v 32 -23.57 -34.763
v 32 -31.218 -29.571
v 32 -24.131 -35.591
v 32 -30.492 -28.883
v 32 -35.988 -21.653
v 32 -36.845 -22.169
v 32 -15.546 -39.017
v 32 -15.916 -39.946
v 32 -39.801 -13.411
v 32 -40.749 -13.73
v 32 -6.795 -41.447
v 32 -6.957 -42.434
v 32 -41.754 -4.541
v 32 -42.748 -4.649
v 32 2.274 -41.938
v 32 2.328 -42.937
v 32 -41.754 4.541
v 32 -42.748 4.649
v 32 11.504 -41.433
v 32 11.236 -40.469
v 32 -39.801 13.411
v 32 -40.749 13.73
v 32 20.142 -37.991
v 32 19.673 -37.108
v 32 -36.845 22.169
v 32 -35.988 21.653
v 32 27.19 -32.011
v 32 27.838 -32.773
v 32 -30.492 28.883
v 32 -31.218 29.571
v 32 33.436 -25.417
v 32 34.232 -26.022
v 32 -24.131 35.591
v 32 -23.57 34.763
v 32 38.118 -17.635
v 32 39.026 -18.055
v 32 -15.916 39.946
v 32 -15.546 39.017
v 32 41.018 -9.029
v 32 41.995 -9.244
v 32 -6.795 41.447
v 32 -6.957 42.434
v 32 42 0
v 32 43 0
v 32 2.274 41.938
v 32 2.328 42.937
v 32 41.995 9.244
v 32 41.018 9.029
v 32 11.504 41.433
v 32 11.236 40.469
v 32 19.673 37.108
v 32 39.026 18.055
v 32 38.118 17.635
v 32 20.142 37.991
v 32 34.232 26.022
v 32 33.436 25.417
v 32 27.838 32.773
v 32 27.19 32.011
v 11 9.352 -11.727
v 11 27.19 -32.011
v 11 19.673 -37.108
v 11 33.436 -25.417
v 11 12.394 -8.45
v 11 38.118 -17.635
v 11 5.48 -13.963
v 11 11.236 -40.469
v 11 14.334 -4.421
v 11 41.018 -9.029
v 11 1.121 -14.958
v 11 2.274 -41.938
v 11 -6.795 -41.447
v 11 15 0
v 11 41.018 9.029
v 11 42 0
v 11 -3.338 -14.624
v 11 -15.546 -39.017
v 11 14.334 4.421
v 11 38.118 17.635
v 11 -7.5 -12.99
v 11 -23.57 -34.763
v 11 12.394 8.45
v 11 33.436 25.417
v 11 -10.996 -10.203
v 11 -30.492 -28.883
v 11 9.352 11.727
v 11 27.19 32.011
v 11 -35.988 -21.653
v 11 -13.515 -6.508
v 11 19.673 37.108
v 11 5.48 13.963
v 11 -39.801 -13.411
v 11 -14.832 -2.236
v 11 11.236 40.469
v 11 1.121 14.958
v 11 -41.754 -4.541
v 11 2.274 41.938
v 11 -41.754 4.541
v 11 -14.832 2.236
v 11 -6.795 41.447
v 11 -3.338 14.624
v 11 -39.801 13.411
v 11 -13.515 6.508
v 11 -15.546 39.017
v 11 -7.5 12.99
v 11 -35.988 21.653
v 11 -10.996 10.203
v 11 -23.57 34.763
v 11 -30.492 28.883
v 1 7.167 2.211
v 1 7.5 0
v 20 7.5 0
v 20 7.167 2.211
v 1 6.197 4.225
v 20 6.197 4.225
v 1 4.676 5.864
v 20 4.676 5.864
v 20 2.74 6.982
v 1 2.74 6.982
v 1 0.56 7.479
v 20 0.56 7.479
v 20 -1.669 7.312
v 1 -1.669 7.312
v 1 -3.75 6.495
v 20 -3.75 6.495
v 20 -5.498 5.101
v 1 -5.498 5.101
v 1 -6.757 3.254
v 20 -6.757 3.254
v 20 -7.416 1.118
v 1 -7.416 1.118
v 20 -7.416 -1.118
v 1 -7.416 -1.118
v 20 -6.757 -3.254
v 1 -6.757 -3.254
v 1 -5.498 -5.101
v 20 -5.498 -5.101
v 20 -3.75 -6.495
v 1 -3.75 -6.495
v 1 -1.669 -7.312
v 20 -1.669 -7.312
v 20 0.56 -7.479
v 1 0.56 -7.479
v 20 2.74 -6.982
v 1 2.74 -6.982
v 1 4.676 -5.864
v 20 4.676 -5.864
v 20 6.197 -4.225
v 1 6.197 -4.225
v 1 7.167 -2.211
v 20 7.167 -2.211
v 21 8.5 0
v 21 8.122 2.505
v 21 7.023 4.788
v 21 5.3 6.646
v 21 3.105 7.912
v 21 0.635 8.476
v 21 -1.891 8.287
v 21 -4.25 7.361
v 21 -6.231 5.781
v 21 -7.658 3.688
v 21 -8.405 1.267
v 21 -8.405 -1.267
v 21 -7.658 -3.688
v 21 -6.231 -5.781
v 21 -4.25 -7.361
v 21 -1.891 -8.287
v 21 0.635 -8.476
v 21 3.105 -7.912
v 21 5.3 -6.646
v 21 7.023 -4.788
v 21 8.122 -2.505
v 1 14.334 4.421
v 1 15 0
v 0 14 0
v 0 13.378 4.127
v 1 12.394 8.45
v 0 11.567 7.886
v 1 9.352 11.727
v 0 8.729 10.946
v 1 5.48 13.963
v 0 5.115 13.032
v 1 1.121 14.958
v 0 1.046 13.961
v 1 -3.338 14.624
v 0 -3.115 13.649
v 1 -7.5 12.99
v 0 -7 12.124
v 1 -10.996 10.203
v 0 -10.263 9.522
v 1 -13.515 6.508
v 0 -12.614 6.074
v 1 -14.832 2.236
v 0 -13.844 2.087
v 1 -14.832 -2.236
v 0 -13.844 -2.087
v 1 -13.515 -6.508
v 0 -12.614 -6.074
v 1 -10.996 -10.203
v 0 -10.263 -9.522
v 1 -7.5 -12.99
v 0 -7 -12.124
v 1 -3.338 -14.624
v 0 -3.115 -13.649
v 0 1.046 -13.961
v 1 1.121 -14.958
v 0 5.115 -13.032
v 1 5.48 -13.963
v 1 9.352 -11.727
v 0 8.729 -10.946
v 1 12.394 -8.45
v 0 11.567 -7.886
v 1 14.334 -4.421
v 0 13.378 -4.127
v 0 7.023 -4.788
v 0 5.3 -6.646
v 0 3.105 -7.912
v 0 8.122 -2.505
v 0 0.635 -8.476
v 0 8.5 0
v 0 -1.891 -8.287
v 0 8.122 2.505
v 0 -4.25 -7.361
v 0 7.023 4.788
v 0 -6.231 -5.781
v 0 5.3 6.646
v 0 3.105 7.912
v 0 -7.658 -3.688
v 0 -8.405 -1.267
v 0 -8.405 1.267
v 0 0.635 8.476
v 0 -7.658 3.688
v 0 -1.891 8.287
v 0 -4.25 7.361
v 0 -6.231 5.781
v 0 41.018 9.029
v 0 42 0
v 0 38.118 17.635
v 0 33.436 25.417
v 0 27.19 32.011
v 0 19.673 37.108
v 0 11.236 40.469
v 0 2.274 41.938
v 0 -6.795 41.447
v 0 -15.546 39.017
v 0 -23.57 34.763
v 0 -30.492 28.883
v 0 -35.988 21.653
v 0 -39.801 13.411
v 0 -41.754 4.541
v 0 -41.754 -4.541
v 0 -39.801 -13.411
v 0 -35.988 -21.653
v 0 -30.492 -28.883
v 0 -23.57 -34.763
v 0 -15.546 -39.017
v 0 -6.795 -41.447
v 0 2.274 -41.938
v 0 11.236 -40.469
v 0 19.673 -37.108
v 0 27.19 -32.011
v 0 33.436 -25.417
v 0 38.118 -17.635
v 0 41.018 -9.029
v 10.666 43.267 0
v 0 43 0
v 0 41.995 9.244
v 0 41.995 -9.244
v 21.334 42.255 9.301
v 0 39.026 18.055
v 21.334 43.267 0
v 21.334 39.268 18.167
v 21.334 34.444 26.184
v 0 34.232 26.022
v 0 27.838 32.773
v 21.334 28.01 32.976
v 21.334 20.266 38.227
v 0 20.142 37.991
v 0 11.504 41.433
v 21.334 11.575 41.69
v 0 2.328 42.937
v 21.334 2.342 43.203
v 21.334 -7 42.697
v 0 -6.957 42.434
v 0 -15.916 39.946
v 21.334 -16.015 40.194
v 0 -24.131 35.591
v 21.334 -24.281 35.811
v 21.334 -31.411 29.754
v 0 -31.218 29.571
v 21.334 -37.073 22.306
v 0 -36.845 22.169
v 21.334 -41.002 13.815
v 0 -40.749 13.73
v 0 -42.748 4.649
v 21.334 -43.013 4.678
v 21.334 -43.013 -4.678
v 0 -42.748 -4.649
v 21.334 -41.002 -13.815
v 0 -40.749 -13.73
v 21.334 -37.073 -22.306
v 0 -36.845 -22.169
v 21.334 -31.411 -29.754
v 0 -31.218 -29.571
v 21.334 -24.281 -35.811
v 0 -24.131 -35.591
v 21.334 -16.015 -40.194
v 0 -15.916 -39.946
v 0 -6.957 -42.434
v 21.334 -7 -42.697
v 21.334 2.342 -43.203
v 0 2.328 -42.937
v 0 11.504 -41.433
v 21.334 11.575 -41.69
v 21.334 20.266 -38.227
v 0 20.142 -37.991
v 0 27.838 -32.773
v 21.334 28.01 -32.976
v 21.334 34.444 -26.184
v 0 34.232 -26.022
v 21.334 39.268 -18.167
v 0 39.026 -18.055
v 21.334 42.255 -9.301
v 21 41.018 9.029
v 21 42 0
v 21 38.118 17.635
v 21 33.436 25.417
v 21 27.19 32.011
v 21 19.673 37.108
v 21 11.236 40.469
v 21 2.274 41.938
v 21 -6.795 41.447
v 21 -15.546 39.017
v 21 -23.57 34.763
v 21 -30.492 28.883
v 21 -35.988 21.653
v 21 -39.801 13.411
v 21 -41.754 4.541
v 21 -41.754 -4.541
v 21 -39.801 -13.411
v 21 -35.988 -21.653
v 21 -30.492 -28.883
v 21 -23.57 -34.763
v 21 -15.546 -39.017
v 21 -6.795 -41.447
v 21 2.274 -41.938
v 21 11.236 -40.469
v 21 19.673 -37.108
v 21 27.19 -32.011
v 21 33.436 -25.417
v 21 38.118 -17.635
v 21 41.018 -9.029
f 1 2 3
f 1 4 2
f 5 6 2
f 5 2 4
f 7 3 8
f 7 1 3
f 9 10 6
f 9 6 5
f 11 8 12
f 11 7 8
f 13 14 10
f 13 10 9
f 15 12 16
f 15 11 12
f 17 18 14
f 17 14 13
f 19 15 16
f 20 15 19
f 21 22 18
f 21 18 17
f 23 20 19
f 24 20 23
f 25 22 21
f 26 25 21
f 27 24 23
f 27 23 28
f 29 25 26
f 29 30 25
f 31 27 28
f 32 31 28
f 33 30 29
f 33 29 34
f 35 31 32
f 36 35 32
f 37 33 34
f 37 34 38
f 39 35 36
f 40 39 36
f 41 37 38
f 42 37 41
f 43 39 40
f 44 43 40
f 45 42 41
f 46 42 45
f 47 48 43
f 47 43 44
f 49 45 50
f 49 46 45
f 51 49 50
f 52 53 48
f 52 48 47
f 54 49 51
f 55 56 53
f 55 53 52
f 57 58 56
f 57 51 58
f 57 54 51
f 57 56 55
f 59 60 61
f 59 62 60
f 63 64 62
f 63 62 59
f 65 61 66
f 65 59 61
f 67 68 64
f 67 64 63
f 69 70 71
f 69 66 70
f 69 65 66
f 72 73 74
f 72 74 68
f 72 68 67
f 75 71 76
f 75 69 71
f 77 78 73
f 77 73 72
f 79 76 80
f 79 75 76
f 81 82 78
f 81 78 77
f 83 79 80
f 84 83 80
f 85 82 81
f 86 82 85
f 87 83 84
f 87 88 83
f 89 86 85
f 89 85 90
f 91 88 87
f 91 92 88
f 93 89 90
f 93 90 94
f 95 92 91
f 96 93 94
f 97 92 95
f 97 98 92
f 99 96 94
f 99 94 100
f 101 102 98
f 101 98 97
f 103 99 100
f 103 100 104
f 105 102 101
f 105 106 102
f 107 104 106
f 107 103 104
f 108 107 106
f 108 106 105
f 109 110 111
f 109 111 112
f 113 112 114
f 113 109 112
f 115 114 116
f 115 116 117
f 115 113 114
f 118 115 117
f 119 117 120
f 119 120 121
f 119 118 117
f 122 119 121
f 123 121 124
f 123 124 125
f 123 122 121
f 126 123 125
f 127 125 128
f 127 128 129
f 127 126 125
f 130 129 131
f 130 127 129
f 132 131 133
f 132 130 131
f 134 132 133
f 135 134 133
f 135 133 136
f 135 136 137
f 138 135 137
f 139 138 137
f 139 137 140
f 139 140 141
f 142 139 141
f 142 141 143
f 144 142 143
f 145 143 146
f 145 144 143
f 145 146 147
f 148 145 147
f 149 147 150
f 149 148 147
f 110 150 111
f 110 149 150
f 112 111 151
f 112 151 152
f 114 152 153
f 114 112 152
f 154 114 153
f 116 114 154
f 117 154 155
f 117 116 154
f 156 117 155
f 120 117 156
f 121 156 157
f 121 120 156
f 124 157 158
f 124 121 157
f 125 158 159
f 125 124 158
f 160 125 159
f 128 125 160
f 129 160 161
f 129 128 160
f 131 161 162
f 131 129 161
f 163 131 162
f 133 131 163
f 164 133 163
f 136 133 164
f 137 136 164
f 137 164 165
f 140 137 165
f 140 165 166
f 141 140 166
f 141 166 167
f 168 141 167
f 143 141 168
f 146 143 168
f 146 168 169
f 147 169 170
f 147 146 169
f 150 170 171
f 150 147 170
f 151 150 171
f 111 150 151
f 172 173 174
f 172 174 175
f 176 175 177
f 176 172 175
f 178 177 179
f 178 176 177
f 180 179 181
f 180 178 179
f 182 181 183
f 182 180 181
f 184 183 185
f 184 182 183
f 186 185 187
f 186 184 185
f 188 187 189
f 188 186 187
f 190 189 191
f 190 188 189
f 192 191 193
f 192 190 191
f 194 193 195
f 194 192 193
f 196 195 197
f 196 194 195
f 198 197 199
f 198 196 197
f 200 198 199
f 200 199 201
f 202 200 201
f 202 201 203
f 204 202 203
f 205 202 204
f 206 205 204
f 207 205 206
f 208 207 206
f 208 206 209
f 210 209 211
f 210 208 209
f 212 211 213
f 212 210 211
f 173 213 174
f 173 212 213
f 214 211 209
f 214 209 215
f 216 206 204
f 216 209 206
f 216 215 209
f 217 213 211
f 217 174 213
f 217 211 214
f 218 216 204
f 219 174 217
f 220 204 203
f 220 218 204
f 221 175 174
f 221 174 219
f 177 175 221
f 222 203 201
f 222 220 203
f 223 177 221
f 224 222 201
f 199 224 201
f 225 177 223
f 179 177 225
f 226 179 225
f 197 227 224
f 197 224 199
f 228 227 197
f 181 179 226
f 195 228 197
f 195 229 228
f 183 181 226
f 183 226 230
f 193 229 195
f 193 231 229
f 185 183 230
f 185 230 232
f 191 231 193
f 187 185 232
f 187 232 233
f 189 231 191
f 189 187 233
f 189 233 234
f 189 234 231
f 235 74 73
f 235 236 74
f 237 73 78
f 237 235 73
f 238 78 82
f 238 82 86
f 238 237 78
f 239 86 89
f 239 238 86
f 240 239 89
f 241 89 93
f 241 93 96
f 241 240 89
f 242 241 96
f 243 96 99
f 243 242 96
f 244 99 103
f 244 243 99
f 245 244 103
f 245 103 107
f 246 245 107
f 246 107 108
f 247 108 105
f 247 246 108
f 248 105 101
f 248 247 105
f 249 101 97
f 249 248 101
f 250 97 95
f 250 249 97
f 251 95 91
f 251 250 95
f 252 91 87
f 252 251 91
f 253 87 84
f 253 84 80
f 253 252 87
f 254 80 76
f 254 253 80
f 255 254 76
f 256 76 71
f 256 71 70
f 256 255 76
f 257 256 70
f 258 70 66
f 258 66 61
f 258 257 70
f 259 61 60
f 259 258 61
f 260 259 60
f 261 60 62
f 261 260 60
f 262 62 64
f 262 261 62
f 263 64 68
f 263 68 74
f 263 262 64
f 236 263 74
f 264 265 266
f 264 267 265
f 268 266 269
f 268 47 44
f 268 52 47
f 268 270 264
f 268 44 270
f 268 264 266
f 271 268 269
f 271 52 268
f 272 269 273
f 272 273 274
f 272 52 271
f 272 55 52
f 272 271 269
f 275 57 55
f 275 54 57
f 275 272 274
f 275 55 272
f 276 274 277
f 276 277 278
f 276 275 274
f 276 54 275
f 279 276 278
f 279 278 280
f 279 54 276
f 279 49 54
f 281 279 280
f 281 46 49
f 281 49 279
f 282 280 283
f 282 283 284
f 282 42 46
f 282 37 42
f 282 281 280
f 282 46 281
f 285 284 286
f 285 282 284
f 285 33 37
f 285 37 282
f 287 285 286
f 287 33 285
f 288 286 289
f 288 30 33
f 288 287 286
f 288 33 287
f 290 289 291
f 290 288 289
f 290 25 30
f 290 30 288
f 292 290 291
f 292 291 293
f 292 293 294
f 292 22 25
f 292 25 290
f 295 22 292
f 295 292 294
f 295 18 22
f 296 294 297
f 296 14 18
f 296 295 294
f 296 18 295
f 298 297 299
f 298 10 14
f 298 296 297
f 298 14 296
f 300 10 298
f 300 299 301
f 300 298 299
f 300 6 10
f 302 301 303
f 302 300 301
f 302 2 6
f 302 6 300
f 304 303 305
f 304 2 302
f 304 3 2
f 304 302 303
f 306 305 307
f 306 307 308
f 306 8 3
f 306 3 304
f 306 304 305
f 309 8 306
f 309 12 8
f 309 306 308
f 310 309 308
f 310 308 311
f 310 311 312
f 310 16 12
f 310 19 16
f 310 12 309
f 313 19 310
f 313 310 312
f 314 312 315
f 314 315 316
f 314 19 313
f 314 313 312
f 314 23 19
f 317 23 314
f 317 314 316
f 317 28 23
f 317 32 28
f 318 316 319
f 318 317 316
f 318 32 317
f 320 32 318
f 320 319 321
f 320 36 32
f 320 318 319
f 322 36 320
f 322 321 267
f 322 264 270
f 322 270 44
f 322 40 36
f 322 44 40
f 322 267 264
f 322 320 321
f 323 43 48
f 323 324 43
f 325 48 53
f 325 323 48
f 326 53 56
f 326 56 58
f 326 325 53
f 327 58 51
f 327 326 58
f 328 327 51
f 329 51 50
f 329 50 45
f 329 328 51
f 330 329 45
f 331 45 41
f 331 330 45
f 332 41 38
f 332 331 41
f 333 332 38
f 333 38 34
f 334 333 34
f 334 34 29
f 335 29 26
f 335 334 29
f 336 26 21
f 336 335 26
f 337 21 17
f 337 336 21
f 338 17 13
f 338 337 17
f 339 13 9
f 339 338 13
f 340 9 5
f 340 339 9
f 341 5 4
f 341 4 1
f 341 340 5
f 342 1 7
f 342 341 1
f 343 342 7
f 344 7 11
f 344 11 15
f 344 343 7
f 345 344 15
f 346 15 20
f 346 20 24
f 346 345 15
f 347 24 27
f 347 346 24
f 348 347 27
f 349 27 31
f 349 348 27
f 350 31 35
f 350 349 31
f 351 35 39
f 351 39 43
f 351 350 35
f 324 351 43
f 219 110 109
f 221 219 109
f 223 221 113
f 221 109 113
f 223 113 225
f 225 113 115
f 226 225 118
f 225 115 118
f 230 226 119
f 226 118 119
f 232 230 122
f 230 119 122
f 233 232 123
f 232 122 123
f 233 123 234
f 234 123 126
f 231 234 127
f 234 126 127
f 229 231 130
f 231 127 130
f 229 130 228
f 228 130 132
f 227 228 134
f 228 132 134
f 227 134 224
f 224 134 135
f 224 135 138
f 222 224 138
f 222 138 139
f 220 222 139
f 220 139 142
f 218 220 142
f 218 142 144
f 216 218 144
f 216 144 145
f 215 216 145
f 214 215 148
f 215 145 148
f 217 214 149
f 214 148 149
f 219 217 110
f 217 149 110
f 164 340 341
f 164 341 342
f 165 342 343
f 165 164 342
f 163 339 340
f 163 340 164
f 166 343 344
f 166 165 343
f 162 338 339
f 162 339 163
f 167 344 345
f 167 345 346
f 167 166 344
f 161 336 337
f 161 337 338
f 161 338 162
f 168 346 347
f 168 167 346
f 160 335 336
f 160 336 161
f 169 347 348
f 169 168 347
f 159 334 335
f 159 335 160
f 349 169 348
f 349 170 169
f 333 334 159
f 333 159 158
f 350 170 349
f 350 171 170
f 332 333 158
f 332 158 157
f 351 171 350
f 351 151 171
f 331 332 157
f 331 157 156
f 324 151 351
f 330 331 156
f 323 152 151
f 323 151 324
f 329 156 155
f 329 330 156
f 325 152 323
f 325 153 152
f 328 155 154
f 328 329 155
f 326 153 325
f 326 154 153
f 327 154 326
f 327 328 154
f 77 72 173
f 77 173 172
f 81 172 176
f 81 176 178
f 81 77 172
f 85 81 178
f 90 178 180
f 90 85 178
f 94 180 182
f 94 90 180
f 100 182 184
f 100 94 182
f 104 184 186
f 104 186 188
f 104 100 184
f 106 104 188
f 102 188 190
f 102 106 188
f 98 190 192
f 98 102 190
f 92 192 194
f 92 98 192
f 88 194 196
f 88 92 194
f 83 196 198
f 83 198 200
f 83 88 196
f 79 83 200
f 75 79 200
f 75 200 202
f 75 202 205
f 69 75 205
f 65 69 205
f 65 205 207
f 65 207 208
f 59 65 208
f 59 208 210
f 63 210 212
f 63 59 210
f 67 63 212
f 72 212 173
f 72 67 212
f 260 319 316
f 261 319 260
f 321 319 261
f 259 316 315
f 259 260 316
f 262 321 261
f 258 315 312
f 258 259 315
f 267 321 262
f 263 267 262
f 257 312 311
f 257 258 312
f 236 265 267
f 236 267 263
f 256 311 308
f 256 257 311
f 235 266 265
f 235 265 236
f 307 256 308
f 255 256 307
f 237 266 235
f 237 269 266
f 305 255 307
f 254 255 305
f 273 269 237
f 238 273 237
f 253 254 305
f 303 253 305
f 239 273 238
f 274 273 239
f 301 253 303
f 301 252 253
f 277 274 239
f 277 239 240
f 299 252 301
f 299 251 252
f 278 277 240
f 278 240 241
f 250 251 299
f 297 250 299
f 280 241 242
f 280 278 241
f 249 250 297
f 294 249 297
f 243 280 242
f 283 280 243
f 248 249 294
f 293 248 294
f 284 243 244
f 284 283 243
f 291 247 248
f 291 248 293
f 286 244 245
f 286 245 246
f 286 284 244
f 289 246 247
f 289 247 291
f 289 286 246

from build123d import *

# Parameters (mm, degrees)
CHAMFER_2_SIZE = 1


with BuildPart() as part:
    # Эскиз1 → Повернуть1 (revolve)
    with BuildSketch(Plane.XY):
        with BuildLine():
            Line((0, 7.5), (0, 15))
            Line((0, 15), (11, 15))
            Line((11, 15), (11, 42))
            Line((11, 42), (0, 42))
            Line((0, 42), (0, 43))
            ThreePointArc((0, 43), (16, 43.3), (32, 43))
            Line((32, 43), (32, 42))
            Line((32, 42), (21, 42))
            Line((21, 42), (21, 7.5))
            Line((21, 7.5), (0, 7.5))
        make_face()
    revolve(axis=Axis((0, 0, 0), (1, 0, 0)))

    # Фаска2
    chamfer_2_edges = [part.edges().sort_by_distance(p)[0] for p in [
        (0, -15, 0),
        (0, -7.5, 0),
        (21, -7.5, 0),
    ]]
    chamfer(chamfer_2_edges, length=CHAMFER_2_SIZE)


solid = part.part
